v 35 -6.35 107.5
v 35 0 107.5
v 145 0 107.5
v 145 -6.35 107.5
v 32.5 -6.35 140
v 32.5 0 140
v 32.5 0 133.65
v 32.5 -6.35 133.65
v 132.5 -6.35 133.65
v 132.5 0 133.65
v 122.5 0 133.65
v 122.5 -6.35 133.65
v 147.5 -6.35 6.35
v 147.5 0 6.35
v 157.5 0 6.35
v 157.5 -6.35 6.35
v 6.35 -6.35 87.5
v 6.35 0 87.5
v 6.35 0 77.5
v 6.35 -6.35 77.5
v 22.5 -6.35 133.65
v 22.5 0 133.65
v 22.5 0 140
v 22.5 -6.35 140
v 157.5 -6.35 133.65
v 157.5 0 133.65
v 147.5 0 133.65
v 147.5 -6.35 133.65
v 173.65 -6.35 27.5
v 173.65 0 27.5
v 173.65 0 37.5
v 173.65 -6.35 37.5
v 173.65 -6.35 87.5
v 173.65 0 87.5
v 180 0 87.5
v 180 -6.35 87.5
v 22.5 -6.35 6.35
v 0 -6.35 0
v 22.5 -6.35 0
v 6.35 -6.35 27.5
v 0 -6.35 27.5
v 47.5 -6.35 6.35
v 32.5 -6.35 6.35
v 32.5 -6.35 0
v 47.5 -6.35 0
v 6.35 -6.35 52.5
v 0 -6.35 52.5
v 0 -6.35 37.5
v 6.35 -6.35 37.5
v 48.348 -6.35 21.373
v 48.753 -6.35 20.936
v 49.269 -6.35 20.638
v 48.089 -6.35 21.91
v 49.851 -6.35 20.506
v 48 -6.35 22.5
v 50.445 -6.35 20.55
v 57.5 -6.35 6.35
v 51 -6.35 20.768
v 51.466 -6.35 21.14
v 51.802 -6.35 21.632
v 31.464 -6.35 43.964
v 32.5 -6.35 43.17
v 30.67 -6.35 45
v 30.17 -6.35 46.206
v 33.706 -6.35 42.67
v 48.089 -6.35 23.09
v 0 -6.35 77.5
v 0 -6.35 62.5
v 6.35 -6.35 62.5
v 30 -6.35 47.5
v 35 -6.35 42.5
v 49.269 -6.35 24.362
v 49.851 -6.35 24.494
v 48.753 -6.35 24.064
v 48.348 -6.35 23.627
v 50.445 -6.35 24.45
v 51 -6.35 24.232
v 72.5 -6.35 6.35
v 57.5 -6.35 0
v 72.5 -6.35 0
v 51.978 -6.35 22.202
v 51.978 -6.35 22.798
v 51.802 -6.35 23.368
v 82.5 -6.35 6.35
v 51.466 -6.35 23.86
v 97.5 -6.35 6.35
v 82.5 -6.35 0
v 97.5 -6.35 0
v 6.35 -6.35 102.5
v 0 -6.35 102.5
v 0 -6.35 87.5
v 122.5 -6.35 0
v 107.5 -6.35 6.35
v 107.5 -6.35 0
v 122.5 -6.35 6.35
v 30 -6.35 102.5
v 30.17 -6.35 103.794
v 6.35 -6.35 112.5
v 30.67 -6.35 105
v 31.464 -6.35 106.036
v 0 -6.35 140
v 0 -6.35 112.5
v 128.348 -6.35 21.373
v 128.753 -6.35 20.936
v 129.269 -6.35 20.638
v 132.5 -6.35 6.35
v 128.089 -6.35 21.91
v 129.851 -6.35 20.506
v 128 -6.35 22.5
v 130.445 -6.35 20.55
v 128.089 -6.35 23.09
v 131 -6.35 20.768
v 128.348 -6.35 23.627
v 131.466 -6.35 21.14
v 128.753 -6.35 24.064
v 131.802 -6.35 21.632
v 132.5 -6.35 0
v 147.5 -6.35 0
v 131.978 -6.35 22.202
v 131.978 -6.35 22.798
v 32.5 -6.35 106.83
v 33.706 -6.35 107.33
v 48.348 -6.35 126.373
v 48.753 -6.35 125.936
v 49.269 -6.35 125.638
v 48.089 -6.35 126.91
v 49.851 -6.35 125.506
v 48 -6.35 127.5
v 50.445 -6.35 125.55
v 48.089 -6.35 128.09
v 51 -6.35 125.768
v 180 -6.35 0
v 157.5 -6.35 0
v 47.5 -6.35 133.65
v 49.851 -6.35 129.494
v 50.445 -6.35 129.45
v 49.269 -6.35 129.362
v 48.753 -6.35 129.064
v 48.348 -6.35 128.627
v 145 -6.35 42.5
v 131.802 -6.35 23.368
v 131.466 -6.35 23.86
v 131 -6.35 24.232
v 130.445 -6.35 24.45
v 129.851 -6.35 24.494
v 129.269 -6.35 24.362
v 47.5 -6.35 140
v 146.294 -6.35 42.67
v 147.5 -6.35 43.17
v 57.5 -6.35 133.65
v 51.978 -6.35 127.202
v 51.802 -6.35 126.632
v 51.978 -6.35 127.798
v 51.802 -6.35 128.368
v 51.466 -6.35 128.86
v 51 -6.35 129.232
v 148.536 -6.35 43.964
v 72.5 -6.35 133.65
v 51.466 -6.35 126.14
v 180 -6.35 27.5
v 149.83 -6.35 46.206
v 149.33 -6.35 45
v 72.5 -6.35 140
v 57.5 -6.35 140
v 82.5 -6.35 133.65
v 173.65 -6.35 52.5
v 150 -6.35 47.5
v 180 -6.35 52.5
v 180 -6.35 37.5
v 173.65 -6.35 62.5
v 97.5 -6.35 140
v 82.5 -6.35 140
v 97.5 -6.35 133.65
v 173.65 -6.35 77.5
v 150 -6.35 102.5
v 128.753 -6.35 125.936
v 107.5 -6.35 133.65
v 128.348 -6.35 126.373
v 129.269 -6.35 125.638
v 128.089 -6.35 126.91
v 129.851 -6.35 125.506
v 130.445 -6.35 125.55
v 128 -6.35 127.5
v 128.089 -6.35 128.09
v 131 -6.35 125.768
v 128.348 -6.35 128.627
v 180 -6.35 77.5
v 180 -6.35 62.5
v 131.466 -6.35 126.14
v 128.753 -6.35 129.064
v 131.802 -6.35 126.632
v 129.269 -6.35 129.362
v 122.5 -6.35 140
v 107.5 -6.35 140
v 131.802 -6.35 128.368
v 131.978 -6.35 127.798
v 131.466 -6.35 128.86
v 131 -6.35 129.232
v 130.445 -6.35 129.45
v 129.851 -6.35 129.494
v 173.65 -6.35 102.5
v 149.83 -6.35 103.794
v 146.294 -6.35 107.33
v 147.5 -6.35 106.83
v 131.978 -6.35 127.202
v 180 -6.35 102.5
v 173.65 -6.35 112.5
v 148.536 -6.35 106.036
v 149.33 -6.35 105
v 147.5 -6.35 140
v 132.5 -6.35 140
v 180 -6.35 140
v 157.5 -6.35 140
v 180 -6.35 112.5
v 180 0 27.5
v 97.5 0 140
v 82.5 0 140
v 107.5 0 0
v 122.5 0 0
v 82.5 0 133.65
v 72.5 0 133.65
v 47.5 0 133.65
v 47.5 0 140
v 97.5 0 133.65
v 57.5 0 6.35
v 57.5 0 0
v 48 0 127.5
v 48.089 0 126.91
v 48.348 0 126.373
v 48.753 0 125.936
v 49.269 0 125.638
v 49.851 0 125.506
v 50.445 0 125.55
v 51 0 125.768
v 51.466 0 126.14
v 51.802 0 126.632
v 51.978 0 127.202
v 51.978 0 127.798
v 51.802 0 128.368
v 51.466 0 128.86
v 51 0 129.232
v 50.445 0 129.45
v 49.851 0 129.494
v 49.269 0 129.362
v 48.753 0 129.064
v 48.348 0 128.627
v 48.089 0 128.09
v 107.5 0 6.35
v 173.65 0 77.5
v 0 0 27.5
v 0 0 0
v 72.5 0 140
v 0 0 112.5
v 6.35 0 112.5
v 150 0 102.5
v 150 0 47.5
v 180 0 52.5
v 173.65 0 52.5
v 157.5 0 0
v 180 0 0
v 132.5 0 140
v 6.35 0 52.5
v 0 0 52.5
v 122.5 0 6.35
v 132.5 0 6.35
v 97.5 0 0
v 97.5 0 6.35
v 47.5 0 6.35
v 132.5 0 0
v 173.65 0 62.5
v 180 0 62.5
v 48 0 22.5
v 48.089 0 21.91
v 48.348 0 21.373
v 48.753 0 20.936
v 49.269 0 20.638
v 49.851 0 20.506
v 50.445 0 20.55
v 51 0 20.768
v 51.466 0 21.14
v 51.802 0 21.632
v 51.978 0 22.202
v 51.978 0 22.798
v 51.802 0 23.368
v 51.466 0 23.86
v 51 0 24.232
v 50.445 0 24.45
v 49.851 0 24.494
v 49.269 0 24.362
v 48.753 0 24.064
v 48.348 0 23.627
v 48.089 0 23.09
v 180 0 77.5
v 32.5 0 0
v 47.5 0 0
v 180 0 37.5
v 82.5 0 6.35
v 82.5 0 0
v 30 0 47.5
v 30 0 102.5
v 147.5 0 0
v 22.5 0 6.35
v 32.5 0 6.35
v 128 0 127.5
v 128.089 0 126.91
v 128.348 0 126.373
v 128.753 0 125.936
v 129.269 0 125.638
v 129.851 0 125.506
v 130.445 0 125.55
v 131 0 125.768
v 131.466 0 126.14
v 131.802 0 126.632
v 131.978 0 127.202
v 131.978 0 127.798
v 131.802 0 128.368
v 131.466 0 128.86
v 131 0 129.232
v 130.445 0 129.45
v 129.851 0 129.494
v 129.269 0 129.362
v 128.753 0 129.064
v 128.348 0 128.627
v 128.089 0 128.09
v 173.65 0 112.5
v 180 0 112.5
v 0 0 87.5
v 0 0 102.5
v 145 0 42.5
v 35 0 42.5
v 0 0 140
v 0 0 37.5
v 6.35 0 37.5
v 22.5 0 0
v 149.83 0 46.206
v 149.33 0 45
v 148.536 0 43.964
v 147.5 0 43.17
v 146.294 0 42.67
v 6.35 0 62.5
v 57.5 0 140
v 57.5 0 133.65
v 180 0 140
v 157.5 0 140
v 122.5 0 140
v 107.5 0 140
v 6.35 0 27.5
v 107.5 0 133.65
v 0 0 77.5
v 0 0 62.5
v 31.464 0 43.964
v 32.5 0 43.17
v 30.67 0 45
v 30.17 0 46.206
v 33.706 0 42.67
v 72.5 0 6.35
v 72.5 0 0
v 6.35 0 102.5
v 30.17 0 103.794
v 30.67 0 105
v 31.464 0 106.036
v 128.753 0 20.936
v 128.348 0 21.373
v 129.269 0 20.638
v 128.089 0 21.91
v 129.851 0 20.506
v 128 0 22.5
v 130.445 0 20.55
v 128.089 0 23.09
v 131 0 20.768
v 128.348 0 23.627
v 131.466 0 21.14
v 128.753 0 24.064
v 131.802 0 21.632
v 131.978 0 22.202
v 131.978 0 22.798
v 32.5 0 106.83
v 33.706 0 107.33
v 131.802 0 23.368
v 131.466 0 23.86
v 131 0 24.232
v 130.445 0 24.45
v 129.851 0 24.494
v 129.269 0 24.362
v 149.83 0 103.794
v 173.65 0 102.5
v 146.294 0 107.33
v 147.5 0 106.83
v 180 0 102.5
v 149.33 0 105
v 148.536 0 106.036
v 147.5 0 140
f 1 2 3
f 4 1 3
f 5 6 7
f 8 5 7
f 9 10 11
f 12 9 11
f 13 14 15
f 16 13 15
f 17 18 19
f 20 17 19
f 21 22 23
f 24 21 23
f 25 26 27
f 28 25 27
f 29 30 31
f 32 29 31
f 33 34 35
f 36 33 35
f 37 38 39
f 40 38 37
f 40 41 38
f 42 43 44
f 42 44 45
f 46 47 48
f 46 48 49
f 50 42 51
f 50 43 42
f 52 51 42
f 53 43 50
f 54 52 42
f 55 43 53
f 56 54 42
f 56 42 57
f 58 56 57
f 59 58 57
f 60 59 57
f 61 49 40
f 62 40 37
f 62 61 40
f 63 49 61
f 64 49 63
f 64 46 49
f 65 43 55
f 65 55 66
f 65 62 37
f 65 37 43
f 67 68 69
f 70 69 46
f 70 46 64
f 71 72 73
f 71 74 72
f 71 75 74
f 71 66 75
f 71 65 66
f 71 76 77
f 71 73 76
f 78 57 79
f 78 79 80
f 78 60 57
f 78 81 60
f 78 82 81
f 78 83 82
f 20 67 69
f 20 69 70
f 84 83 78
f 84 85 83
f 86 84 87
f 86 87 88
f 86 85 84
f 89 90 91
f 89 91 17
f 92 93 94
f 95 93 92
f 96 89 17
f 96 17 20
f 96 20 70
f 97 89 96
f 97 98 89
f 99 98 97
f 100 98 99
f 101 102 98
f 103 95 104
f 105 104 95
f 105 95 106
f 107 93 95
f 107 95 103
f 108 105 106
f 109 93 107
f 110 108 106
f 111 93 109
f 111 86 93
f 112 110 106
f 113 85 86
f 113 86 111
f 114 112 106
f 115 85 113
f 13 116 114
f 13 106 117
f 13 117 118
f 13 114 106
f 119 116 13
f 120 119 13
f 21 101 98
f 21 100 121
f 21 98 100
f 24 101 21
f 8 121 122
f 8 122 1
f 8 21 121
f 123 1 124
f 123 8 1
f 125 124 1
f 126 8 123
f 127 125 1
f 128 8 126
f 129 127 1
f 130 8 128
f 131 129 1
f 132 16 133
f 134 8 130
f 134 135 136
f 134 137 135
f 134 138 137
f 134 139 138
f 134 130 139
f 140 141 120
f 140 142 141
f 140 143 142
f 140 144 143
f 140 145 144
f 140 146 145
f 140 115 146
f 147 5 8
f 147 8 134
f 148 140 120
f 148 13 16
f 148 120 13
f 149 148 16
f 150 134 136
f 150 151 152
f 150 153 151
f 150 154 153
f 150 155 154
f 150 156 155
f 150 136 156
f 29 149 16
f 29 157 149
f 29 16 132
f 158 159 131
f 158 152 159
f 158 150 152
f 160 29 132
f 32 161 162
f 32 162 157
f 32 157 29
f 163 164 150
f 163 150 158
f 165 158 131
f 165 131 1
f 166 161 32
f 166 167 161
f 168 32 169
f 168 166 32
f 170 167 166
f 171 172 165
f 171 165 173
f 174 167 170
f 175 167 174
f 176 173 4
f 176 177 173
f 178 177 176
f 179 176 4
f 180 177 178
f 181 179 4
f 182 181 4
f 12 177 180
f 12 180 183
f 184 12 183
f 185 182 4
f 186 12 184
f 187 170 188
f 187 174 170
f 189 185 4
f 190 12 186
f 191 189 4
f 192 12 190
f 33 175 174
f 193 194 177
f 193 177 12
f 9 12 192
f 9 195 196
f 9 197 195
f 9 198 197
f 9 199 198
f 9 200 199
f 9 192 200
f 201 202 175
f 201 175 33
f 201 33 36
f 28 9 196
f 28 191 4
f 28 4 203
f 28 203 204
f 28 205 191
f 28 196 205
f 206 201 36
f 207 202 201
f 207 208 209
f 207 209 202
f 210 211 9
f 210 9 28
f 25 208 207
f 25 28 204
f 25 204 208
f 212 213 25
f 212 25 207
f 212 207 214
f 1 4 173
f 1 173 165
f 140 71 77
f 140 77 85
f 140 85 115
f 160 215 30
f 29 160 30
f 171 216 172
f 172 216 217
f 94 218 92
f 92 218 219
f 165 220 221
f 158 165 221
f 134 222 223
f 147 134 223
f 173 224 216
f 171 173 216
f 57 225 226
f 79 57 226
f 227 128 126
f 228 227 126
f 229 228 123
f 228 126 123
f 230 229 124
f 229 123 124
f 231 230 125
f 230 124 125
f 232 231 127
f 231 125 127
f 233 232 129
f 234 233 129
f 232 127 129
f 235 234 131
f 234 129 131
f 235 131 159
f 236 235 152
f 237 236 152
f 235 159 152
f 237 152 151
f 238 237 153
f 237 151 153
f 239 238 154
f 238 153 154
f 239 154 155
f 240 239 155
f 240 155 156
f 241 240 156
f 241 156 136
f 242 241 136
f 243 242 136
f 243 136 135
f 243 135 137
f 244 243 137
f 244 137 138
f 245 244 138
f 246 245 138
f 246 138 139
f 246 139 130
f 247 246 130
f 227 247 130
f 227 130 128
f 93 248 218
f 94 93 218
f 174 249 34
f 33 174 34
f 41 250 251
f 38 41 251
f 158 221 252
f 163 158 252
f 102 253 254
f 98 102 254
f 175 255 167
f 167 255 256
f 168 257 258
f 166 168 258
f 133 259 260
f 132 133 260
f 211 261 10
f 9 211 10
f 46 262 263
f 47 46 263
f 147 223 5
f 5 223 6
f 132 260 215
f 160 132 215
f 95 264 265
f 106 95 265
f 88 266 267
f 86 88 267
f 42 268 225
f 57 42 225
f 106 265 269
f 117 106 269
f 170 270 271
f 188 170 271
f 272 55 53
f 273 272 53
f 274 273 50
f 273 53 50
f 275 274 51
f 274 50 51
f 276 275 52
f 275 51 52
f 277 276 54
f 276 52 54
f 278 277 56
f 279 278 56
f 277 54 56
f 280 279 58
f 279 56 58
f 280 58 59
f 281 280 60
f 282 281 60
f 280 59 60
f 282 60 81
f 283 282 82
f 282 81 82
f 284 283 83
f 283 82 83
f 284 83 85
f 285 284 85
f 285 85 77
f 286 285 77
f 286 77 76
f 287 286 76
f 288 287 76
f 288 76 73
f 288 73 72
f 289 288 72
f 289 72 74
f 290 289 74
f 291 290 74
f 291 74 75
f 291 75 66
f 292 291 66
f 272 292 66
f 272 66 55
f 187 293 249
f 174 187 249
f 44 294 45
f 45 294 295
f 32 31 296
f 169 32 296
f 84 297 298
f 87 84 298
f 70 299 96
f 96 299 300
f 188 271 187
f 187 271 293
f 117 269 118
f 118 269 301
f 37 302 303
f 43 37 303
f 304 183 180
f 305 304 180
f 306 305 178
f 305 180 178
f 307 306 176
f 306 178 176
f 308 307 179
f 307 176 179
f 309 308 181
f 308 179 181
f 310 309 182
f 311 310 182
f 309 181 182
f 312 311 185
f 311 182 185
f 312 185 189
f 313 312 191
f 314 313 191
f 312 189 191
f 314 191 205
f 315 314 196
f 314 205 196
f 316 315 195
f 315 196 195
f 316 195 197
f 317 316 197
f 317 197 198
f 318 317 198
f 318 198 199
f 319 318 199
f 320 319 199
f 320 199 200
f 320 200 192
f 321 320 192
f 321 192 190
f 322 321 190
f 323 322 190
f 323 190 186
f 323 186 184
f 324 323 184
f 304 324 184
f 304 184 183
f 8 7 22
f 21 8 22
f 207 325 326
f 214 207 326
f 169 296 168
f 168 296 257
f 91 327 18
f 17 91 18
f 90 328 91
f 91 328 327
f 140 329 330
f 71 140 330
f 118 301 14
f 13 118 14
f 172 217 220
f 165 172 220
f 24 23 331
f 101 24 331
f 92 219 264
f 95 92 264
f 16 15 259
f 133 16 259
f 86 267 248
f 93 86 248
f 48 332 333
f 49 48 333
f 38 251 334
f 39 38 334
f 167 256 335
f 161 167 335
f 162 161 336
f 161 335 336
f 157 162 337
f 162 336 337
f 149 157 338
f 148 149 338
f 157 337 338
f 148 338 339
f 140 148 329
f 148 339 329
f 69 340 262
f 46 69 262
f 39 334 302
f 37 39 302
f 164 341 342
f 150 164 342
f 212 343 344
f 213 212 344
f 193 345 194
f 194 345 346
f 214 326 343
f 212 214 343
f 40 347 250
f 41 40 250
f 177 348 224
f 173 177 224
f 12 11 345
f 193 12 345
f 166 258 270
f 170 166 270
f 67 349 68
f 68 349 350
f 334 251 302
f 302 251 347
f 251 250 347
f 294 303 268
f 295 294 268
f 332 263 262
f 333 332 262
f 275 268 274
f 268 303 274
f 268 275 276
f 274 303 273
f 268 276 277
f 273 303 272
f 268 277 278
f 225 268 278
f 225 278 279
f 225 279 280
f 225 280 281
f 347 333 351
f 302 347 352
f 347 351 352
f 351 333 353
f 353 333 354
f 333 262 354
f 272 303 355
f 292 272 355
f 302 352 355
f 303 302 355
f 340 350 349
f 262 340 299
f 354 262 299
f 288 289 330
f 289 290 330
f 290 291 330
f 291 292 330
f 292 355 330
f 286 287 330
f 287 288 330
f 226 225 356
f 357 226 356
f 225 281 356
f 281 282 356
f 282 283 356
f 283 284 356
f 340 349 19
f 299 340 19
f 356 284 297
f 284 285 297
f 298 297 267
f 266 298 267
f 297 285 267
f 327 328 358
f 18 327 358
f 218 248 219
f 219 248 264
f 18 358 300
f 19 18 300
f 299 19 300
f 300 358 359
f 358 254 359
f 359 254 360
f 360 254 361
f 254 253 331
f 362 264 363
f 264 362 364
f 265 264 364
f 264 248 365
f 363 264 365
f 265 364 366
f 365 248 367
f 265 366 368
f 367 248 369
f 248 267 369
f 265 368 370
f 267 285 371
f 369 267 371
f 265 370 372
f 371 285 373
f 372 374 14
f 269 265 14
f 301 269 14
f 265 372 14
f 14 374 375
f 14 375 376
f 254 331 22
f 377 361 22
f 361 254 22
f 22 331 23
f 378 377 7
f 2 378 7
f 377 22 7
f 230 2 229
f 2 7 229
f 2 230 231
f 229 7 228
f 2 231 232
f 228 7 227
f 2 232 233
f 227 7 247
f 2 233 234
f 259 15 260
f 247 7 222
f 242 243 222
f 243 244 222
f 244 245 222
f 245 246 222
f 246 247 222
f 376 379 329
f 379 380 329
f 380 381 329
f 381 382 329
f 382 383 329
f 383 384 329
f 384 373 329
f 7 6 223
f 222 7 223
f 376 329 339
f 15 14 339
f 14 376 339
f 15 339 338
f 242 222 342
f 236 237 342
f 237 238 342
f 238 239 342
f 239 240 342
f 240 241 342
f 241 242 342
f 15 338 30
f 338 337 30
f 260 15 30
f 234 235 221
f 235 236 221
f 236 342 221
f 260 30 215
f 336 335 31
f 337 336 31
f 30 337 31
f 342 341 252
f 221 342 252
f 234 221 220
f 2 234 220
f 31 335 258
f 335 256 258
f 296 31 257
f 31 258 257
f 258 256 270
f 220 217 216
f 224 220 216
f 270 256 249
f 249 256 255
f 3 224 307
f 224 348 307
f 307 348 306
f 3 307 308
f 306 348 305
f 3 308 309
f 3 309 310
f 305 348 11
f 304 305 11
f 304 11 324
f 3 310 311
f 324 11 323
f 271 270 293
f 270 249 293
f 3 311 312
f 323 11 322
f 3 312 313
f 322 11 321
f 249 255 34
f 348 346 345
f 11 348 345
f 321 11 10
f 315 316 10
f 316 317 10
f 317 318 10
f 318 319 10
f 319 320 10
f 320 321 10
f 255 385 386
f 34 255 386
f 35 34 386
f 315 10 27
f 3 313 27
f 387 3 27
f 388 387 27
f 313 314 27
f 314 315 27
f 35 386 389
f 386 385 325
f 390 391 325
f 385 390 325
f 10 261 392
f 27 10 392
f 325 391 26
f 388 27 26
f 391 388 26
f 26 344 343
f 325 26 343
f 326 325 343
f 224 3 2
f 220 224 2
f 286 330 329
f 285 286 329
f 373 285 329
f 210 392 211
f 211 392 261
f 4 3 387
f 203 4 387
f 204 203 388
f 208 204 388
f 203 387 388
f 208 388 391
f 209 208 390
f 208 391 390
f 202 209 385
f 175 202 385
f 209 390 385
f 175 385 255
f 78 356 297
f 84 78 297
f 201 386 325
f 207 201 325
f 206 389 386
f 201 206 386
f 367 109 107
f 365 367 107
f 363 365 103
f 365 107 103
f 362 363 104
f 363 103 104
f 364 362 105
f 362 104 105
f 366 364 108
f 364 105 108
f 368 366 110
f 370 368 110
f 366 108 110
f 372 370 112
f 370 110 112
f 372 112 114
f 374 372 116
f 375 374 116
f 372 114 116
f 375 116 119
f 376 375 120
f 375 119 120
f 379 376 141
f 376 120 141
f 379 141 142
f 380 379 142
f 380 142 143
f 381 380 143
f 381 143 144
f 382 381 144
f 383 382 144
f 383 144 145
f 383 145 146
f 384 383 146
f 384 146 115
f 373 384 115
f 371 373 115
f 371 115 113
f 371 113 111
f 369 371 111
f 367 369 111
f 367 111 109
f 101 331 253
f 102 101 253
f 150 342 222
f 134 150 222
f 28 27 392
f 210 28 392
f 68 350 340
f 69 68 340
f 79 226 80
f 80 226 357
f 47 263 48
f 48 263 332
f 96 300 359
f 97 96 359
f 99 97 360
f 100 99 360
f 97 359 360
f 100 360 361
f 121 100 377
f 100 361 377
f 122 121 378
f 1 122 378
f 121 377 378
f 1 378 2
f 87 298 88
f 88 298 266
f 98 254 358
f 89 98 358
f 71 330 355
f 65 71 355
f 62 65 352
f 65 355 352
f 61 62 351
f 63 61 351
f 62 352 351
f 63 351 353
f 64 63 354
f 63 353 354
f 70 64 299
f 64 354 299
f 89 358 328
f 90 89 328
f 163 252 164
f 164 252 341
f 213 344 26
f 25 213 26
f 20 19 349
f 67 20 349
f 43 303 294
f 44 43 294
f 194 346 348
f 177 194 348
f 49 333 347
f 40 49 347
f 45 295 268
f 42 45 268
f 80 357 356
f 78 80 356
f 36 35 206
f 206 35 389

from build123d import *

# Parameters (mm, degrees)
F0_R     = 1.5
F1_DEPTH = 6.35
F2_D     = 4


with BuildPart() as f1:
    # F0 (on Front) → F1 (new body)
    with BuildSketch(Plane.XZ):
        Polygon((180, 112.5), (180, 140), (157.5, 140), (157.5, 133.65), (147.5, 133.65), (147.5, 140), (132.5, 140), (132.5, 133.65), (122.5, 133.65), (122.5, 140), (107.5, 140), (107.5, 133.65), (97.5, 133.65), (97.5, 140), (82.5, 140), (82.5, 133.65), (72.5, 133.65), (72.5, 140), (57.5, 140), (57.5, 133.65), (47.5, 133.65), (47.5, 140), (32.5, 140), (32.5, 133.65), (22.5, 133.65), (22.5, 140), (0, 140), (0, 112.5), (6.35, 112.5), (6.35, 102.5), (0, 102.5), (0, 87.5), (6.35, 87.5), (6.35, 77.5), (0, 77.5), (0, 62.5), (6.35, 62.5), (6.35, 52.5), (0, 52.5), (0, 37.5), (6.35, 37.5), (6.35, 27.5), (0, 27.5), (0, 0), (22.5, 0), (22.5, 6.35), (32.5, 6.35), (32.5, 0), (47.5, 0), (47.5, 6.35), (57.5, 6.35), (57.5, 0), (72.5, 0), (72.5, 6.35), (82.5, 6.35), (82.5, 0), (97.5, 0), (97.5, 6.35), (107.5, 6.35), (107.5, 0), (122.5, 0), (122.5, 6.35), (132.5, 6.35), (132.5, 0), (147.5, 0), (147.5, 6.35), (157.5, 6.35), (157.5, 0), (180, 0), (180, 27.5), (173.65, 27.5), (173.65, 37.5), (180, 37.5), (180, 52.5), (173.65, 52.5), (173.65, 62.5), (180, 62.5), (180, 77.5), (173.65, 77.5), (173.65, 87.5), (180, 87.5), (180, 102.5), (173.65, 102.5), (173.65, 112.5), align=None)
        with Locations((50, 22.5)):
            Circle(F0_R, mode=Mode.SUBTRACT)
        with Locations((130, 22.5)):
            Circle(F0_R, mode=Mode.SUBTRACT)
        with Locations((50, 127.5)):
            Circle(F0_R, mode=Mode.SUBTRACT)
        with BuildLine():
            ThreePointArc((30, 102.5), (31.4644660941, 106.0355339059), (35, 107.5))
            Line((35, 107.5), (145, 107.5))
            ThreePointArc((145, 107.5), (148.5355339059, 106.0355339059), (150, 102.5))
            Line((150, 102.5), (150, 47.5))
            ThreePointArc((150, 47.5), (148.5355339059, 43.9644660941), (145, 42.5))
            Line((145, 42.5), (35, 42.5))
            ThreePointArc((35, 42.5), (31.4644660941, 43.9644660941), (30, 47.5))
            Line((30, 47.5), (30, 102.5))
        make_face(mode=Mode.SUBTRACT)
        with Locations((130, 127.5)):
            Circle(F0_R, mode=Mode.SUBTRACT)
    extrude(amount=F1_DEPTH)

    # F2 (through all)
    with Locations(Plane(origin=(0, 0, 0), x_dir=(1, 0, 0), z_dir=(0, 1, 0))):
        with Locations((50, -127.5), (130, -127.5), (130, -22.5), (50, -22.5)):
            Hole(F2_D / 2)


solid = f1.part
